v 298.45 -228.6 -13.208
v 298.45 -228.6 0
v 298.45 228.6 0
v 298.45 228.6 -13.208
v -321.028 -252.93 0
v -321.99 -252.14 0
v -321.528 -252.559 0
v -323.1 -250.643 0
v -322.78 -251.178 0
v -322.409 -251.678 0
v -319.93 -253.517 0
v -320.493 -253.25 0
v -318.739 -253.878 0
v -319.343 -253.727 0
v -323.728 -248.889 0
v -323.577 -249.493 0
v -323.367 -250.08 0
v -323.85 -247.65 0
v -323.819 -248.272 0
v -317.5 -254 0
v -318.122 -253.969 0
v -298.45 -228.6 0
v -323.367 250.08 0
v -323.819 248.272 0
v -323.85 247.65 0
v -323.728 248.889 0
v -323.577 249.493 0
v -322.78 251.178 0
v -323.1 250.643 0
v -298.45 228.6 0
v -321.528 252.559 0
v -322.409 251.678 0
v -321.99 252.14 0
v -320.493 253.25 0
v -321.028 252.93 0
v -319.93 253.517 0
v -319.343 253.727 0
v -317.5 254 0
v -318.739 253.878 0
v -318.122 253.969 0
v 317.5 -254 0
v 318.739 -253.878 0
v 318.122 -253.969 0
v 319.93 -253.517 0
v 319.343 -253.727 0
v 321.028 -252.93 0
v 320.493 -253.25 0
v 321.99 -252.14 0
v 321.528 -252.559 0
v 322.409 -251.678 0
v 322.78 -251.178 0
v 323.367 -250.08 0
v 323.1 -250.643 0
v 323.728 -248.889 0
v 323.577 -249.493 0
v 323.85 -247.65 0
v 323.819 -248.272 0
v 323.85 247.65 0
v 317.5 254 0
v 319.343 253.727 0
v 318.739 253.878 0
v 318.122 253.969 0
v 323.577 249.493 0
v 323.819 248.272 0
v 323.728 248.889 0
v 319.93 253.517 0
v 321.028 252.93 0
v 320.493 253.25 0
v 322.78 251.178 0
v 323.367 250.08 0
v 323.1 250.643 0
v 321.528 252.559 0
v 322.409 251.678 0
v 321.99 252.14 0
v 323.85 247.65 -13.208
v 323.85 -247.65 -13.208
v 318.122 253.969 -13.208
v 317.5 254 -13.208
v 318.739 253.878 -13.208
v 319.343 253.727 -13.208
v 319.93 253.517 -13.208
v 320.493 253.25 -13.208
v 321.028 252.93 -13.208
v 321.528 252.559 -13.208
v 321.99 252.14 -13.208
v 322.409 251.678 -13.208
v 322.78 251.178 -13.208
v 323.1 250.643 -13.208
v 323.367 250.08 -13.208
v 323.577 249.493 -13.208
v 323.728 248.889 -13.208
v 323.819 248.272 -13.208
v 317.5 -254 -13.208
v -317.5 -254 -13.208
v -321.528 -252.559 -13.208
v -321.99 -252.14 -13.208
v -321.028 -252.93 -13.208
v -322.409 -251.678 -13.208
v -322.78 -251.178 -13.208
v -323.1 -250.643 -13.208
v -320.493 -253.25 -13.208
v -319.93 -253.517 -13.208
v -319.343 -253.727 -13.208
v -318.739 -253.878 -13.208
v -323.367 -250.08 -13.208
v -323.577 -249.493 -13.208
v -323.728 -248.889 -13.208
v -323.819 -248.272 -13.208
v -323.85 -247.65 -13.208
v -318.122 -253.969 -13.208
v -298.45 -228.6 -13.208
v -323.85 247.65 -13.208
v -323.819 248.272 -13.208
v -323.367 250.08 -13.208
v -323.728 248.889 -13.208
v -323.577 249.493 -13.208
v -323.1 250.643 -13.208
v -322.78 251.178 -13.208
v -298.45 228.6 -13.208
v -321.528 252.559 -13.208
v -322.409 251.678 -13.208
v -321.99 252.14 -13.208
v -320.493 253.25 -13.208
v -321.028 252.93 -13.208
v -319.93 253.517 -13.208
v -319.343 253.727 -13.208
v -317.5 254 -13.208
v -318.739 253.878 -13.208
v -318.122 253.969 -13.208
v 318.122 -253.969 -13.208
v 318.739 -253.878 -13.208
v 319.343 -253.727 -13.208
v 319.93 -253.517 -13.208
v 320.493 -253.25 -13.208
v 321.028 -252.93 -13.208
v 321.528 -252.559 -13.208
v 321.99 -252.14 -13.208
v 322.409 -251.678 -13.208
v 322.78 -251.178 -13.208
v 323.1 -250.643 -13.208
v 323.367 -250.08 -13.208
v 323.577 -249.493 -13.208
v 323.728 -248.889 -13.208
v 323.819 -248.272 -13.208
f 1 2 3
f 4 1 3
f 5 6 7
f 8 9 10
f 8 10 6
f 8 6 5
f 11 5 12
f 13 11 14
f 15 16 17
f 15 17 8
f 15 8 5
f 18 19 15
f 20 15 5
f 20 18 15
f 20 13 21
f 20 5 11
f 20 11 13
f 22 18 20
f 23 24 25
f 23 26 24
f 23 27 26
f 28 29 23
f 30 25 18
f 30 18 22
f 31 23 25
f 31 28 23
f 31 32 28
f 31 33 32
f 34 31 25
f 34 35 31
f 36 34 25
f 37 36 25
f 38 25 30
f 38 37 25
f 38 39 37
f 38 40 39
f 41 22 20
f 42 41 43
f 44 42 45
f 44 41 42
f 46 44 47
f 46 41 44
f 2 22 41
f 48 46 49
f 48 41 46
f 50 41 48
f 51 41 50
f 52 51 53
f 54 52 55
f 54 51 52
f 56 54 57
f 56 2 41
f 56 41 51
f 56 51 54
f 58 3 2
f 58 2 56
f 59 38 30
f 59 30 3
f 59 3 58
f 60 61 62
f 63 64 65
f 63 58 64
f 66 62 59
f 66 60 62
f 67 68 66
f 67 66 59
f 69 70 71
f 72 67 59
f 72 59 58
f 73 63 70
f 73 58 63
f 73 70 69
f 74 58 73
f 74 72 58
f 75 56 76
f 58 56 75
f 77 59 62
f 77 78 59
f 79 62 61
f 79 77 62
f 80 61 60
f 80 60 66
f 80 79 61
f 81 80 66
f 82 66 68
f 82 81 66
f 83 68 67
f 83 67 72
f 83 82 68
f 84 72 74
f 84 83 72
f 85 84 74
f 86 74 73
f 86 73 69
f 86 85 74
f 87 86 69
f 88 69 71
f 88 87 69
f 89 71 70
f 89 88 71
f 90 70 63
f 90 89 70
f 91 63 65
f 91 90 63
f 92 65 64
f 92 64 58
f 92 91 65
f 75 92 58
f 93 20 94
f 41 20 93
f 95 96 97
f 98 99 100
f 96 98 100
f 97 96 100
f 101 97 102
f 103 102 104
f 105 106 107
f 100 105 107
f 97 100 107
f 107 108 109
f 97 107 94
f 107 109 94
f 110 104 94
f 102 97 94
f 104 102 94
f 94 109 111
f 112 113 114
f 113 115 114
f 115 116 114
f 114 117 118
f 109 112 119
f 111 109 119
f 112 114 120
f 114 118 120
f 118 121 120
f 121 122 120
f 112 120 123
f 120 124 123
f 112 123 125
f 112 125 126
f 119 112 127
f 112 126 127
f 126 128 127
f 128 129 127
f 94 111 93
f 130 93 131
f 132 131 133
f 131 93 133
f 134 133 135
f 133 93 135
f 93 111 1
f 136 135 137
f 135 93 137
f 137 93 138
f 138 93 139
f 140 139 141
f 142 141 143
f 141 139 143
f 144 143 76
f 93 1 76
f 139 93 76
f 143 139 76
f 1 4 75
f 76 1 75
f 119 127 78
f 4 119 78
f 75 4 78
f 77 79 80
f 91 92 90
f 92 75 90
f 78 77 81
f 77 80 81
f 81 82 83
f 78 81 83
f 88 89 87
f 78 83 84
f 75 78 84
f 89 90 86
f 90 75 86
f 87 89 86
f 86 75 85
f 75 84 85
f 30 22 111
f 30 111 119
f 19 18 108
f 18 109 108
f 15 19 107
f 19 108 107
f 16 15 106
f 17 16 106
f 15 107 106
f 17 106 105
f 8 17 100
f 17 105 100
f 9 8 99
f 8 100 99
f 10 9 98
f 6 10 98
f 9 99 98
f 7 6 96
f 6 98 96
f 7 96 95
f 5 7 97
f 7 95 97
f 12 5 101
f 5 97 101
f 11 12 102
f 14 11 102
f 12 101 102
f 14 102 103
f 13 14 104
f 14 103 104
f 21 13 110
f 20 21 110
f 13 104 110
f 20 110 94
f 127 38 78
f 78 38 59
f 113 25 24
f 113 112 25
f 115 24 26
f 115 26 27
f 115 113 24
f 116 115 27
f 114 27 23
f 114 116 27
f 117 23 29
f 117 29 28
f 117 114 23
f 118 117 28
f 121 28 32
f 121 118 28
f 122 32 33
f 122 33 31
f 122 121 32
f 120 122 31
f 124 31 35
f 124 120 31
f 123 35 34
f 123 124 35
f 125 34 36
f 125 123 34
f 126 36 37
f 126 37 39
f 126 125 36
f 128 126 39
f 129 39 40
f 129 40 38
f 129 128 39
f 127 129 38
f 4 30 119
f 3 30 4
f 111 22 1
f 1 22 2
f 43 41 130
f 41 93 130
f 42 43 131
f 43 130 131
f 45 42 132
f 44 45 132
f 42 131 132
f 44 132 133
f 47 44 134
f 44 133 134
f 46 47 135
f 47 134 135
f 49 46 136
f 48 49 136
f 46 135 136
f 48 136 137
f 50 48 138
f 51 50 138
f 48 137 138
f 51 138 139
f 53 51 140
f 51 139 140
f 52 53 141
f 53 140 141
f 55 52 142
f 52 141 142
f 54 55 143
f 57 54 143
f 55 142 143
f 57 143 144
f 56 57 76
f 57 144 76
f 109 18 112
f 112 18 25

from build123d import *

# Parameters (mm, degrees)
SKETCH1_W      = 647.7
SKETCH1_H      = 508
SKETCH1_W_2    = 596.9
SKETCH1_H_2    = 457.2
EXTRUDE1_DEPTH = 13.208
FILLET1_R      = 6.35


with BuildPart() as part:
    # Sketch1 → Extrude1 (new body)
    with BuildSketch(Plane.XY):
        Rectangle(SKETCH1_W, SKETCH1_H)
        Rectangle(SKETCH1_W_2, SKETCH1_H_2, mode=Mode.SUBTRACT)
    extrude(amount=-EXTRUDE1_DEPTH)

    # Fillet1
    fillet1_edges = [part.edges().sort_by_distance(p)[0] for p in [
        (323.85, 254, -6.604),
        (323.85, -254, -6.604),
        (-323.85, -254, -6.604),
        (-323.85, 254, -6.604),
    ]]
    fillet(fillet1_edges, radius=FILLET1_R)


solid = part.part
